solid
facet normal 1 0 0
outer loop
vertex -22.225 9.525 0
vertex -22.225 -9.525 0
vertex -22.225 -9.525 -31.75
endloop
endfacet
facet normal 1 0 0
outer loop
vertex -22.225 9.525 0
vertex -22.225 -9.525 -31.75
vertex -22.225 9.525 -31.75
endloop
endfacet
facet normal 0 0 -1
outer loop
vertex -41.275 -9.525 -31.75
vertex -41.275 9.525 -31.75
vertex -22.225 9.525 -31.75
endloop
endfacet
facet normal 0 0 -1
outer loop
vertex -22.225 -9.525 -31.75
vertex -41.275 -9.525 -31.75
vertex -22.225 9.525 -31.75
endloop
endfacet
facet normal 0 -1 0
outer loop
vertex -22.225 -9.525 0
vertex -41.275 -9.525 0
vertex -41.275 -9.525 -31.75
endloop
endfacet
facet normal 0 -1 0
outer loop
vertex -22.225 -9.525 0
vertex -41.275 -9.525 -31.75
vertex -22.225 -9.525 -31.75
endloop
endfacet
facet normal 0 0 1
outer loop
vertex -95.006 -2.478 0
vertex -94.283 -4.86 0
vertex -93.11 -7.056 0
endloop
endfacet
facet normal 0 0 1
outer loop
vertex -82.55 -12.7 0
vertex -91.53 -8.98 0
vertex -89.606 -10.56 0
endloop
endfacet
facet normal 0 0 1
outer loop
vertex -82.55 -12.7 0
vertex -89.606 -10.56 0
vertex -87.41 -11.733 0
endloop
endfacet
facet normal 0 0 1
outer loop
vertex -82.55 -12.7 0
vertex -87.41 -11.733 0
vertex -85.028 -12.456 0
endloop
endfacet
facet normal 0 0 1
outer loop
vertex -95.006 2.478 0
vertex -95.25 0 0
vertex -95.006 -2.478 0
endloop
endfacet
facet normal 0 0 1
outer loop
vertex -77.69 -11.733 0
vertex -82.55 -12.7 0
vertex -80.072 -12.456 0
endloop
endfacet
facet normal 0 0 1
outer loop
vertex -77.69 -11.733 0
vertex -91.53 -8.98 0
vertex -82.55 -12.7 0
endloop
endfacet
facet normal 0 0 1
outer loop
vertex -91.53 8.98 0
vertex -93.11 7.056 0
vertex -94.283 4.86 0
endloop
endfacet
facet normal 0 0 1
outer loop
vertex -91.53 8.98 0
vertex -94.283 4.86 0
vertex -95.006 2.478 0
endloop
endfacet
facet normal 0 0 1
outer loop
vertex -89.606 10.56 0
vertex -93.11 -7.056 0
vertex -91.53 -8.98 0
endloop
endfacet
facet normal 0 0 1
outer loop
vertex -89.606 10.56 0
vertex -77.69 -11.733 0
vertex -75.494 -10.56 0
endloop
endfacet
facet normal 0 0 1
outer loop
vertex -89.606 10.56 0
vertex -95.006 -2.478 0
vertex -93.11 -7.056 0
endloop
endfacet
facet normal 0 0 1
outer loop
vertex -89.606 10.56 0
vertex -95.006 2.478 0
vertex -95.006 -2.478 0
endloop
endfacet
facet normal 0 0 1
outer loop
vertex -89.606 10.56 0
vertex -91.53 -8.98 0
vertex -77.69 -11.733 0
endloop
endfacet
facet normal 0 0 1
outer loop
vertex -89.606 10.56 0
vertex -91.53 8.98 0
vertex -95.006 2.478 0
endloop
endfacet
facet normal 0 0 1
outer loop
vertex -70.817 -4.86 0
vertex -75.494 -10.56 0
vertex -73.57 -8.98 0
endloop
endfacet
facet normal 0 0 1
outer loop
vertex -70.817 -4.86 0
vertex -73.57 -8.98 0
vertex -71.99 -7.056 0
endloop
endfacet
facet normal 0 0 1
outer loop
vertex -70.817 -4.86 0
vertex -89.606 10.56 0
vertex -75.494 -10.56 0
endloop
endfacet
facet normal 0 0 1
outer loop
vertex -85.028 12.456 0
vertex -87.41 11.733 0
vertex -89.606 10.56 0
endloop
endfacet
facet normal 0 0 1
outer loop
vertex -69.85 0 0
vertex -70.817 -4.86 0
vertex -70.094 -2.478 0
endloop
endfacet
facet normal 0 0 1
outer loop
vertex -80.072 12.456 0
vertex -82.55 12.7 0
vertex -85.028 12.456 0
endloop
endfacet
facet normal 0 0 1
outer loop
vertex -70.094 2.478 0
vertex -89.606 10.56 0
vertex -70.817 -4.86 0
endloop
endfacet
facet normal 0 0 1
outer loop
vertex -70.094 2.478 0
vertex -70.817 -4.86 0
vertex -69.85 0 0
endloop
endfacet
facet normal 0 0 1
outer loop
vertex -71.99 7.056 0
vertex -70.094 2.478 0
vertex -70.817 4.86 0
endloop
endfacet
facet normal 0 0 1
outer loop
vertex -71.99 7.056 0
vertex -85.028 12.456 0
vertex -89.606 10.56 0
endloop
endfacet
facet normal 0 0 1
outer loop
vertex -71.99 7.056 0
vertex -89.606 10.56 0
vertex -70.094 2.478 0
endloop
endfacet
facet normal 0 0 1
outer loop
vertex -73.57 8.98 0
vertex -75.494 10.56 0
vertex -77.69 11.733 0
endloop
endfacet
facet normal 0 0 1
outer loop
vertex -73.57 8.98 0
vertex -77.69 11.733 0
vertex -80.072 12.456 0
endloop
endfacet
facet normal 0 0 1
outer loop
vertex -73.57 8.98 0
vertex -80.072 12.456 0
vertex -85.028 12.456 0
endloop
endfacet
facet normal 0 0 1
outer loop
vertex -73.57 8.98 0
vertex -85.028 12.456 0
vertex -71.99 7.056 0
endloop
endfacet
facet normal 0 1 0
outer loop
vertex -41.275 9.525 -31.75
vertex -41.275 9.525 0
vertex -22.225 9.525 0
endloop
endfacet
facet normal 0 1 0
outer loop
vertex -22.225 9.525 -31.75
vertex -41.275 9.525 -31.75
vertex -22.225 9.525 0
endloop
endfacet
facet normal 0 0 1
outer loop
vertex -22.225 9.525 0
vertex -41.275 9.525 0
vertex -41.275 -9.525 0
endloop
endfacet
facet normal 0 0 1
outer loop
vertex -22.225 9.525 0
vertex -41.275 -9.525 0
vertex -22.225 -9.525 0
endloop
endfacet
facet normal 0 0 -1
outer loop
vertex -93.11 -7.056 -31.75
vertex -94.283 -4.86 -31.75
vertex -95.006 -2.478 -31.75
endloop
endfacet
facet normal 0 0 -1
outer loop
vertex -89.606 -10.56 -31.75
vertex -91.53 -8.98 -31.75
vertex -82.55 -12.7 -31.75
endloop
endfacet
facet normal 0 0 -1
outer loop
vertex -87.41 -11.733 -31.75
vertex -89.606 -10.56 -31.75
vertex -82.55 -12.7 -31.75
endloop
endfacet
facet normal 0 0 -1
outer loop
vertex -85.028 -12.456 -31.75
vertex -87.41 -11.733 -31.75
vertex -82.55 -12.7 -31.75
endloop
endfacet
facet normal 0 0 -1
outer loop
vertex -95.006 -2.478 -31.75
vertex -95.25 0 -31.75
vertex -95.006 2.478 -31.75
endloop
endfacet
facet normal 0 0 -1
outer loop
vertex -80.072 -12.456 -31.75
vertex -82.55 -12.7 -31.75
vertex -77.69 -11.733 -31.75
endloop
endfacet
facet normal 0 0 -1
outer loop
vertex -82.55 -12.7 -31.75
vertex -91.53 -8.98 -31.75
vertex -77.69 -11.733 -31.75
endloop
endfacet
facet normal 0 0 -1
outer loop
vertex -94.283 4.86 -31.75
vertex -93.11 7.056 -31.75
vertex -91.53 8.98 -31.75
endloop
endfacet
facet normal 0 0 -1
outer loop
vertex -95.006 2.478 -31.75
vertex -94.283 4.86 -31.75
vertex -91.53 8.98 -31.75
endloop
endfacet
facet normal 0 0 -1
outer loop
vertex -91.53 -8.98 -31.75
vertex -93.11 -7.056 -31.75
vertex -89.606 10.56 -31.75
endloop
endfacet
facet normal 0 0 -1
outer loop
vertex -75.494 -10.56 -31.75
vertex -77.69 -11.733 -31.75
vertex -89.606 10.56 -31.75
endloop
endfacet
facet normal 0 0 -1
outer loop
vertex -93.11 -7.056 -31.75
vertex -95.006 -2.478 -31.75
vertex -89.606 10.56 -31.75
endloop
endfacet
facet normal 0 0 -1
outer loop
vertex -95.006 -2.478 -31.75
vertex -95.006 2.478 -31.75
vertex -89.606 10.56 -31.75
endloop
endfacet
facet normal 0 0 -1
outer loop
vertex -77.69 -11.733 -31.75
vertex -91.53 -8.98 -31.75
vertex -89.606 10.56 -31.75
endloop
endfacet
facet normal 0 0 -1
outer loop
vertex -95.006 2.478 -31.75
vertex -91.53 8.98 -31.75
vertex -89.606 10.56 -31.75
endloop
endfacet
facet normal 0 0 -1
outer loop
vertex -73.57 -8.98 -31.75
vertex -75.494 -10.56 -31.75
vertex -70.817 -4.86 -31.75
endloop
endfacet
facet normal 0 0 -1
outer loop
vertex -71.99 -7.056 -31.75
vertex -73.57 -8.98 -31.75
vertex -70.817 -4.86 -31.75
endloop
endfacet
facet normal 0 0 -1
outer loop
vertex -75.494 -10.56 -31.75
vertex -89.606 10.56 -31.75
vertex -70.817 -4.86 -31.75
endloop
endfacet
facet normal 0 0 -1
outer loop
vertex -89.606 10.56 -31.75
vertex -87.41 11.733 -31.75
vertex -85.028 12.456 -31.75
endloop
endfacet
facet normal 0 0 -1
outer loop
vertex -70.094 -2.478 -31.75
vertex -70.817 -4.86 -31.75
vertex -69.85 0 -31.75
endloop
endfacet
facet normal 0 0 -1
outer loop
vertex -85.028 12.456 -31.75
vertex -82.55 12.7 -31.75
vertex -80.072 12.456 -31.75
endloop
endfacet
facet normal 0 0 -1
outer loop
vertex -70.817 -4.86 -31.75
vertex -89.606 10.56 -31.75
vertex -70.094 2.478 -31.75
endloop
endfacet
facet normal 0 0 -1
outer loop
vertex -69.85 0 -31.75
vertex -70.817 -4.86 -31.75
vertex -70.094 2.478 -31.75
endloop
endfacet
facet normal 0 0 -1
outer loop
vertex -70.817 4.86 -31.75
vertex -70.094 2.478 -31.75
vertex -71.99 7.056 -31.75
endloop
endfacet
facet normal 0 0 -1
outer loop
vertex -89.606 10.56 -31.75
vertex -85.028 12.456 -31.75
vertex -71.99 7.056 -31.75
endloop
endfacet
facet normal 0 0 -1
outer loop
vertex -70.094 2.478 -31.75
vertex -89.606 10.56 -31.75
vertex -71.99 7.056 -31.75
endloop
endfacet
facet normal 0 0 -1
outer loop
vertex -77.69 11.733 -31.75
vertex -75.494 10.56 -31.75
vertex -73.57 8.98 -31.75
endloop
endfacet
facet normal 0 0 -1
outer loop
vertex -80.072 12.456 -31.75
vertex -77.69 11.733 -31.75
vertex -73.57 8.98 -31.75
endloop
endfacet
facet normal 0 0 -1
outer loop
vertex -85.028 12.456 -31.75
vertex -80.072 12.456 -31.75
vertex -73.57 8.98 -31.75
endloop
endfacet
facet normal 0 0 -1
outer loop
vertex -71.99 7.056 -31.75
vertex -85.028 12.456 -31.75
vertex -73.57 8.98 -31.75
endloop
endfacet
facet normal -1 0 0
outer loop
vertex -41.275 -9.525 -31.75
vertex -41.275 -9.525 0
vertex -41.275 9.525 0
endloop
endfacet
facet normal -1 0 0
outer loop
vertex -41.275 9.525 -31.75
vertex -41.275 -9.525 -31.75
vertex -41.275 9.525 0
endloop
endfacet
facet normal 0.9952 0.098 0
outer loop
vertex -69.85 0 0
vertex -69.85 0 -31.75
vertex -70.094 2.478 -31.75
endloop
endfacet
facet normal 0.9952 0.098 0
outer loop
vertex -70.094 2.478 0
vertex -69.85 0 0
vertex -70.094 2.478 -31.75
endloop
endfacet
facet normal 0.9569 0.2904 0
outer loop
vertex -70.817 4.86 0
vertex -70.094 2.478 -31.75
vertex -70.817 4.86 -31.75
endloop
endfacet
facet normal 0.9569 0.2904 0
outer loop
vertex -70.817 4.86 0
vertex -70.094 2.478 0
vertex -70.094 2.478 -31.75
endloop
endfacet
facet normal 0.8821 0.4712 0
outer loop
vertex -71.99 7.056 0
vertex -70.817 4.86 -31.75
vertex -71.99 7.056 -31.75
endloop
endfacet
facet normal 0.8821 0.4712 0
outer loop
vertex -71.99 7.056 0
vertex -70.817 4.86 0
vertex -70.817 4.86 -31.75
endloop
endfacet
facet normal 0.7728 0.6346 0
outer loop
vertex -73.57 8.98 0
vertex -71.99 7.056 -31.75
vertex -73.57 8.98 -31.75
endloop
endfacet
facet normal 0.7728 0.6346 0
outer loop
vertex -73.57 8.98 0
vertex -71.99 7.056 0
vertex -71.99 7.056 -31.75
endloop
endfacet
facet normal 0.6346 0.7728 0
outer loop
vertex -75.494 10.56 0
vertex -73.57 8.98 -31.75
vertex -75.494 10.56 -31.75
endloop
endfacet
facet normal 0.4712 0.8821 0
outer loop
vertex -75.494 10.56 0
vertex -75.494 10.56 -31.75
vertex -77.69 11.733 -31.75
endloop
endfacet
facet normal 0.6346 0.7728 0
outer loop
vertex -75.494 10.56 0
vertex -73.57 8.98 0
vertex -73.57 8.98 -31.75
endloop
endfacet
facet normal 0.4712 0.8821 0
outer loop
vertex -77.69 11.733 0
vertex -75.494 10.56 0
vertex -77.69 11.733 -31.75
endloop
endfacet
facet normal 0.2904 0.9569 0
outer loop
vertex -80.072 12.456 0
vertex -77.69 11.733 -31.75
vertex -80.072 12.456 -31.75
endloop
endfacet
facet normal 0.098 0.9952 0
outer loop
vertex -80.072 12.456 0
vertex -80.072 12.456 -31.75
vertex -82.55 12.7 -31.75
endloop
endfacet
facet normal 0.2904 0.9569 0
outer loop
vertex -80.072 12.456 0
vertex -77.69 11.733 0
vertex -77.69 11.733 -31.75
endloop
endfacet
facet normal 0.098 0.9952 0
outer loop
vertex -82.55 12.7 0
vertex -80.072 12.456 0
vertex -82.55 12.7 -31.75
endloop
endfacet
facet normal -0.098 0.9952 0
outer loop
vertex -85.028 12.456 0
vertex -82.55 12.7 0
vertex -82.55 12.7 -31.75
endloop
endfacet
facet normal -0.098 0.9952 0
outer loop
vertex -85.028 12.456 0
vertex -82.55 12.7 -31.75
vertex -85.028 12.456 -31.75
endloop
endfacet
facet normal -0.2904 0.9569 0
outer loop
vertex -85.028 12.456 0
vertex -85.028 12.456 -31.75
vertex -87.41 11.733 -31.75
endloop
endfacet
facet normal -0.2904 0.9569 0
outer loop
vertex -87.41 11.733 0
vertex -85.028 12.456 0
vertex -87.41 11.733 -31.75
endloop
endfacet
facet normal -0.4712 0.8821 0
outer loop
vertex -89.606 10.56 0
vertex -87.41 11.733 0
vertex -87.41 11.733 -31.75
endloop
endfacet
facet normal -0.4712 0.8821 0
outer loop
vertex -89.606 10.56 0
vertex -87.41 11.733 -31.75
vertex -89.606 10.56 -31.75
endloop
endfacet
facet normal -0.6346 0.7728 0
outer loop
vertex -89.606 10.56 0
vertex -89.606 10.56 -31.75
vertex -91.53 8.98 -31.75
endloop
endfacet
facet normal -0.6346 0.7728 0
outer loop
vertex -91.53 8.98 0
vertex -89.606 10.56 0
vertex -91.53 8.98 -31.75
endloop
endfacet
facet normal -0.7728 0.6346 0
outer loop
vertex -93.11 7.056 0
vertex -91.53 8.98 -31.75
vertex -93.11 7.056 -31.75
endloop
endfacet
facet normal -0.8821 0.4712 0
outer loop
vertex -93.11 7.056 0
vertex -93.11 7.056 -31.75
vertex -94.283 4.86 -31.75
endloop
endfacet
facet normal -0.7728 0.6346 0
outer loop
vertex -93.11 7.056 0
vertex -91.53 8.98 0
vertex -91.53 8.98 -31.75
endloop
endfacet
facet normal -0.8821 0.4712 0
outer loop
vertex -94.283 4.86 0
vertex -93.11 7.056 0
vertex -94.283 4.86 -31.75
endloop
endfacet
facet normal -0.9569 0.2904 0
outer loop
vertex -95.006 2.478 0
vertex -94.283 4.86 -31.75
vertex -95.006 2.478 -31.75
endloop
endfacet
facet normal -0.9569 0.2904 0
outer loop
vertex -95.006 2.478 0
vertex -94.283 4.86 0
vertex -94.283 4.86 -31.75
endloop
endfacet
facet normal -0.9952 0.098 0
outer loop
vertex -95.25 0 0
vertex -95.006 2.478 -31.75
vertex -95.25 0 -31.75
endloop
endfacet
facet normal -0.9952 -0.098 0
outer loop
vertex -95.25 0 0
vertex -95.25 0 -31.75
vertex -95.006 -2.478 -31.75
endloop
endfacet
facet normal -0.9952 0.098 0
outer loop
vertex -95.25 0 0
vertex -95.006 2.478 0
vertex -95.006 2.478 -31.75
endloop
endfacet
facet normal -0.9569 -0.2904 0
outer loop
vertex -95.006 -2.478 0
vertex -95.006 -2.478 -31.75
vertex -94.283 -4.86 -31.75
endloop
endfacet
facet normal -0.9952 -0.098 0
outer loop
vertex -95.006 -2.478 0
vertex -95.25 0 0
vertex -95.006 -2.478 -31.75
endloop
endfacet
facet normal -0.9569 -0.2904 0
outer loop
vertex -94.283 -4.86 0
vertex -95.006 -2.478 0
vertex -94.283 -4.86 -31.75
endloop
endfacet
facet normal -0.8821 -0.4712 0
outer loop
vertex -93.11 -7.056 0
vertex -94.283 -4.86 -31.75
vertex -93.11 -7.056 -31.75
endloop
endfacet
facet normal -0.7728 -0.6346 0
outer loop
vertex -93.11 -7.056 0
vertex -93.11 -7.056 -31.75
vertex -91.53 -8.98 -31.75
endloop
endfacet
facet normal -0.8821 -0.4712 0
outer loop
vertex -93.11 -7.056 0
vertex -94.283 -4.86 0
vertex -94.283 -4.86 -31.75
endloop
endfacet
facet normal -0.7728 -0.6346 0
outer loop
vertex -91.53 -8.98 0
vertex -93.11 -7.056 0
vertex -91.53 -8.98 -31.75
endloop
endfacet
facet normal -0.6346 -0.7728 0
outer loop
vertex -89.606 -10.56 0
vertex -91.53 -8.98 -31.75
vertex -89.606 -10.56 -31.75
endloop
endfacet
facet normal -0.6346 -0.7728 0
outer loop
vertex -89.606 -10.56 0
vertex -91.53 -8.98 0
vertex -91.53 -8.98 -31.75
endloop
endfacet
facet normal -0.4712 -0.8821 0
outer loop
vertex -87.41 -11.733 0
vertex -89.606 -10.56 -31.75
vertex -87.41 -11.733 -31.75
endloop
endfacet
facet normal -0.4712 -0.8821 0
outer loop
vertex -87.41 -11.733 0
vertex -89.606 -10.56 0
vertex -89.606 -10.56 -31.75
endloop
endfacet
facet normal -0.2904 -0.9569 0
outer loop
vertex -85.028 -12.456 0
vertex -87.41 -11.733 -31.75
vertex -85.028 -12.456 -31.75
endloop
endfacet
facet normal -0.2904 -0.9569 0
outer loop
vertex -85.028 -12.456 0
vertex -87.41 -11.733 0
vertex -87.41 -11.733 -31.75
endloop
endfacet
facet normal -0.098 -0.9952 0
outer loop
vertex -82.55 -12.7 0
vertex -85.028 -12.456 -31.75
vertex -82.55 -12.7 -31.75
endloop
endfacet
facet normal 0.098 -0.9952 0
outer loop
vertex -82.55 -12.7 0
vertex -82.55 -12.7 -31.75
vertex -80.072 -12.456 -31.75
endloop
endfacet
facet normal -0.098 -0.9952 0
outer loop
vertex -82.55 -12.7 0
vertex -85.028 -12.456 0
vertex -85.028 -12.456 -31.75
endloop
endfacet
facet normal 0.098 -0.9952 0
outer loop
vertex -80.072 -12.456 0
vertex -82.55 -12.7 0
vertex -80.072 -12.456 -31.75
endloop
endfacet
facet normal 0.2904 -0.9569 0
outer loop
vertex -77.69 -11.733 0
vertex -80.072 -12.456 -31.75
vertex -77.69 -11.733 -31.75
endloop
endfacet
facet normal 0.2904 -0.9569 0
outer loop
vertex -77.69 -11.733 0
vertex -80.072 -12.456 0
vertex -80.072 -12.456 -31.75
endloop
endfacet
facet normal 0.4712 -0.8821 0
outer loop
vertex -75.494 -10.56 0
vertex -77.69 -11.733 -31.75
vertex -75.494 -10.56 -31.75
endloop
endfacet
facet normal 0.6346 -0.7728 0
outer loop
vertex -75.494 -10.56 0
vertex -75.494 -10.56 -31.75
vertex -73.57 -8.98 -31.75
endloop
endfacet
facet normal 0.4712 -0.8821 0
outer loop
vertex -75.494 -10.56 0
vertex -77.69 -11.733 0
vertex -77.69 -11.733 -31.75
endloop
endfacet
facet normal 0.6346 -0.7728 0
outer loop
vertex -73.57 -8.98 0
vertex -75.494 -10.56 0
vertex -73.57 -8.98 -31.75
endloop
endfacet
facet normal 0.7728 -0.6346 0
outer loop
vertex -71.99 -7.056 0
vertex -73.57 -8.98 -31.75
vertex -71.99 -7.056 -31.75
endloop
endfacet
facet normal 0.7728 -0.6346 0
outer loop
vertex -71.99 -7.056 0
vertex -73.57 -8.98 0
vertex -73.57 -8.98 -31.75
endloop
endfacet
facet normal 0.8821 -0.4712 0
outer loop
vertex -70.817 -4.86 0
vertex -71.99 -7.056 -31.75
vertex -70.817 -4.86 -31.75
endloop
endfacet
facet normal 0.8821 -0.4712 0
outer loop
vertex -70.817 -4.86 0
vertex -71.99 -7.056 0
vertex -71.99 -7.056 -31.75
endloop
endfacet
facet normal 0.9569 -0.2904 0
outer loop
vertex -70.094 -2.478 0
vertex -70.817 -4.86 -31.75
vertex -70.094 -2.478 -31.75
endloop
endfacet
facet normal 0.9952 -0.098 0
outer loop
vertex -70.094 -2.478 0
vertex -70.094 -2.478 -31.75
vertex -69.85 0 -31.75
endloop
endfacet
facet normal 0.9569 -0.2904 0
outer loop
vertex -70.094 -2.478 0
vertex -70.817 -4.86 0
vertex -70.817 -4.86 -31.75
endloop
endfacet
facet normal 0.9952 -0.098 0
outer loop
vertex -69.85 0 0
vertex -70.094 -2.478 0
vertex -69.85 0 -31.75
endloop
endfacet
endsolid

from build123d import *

# Parameters (mm, degrees)
F0_R     = 12.7
F0_W     = 19.05
F0_H     = 19.05
F1_DEPTH = 31.75


with BuildPart() as f1:
    # F0 (on Top) → F1 (new body)
    with BuildSketch(Plane.XY):
        with Locations((-82.55, 0)):
            Circle(F0_R)
        with Locations((-31.75, 0)):
            Rectangle(F0_W, F0_H)
    extrude(amount=-F1_DEPTH)


solid = f1.part
